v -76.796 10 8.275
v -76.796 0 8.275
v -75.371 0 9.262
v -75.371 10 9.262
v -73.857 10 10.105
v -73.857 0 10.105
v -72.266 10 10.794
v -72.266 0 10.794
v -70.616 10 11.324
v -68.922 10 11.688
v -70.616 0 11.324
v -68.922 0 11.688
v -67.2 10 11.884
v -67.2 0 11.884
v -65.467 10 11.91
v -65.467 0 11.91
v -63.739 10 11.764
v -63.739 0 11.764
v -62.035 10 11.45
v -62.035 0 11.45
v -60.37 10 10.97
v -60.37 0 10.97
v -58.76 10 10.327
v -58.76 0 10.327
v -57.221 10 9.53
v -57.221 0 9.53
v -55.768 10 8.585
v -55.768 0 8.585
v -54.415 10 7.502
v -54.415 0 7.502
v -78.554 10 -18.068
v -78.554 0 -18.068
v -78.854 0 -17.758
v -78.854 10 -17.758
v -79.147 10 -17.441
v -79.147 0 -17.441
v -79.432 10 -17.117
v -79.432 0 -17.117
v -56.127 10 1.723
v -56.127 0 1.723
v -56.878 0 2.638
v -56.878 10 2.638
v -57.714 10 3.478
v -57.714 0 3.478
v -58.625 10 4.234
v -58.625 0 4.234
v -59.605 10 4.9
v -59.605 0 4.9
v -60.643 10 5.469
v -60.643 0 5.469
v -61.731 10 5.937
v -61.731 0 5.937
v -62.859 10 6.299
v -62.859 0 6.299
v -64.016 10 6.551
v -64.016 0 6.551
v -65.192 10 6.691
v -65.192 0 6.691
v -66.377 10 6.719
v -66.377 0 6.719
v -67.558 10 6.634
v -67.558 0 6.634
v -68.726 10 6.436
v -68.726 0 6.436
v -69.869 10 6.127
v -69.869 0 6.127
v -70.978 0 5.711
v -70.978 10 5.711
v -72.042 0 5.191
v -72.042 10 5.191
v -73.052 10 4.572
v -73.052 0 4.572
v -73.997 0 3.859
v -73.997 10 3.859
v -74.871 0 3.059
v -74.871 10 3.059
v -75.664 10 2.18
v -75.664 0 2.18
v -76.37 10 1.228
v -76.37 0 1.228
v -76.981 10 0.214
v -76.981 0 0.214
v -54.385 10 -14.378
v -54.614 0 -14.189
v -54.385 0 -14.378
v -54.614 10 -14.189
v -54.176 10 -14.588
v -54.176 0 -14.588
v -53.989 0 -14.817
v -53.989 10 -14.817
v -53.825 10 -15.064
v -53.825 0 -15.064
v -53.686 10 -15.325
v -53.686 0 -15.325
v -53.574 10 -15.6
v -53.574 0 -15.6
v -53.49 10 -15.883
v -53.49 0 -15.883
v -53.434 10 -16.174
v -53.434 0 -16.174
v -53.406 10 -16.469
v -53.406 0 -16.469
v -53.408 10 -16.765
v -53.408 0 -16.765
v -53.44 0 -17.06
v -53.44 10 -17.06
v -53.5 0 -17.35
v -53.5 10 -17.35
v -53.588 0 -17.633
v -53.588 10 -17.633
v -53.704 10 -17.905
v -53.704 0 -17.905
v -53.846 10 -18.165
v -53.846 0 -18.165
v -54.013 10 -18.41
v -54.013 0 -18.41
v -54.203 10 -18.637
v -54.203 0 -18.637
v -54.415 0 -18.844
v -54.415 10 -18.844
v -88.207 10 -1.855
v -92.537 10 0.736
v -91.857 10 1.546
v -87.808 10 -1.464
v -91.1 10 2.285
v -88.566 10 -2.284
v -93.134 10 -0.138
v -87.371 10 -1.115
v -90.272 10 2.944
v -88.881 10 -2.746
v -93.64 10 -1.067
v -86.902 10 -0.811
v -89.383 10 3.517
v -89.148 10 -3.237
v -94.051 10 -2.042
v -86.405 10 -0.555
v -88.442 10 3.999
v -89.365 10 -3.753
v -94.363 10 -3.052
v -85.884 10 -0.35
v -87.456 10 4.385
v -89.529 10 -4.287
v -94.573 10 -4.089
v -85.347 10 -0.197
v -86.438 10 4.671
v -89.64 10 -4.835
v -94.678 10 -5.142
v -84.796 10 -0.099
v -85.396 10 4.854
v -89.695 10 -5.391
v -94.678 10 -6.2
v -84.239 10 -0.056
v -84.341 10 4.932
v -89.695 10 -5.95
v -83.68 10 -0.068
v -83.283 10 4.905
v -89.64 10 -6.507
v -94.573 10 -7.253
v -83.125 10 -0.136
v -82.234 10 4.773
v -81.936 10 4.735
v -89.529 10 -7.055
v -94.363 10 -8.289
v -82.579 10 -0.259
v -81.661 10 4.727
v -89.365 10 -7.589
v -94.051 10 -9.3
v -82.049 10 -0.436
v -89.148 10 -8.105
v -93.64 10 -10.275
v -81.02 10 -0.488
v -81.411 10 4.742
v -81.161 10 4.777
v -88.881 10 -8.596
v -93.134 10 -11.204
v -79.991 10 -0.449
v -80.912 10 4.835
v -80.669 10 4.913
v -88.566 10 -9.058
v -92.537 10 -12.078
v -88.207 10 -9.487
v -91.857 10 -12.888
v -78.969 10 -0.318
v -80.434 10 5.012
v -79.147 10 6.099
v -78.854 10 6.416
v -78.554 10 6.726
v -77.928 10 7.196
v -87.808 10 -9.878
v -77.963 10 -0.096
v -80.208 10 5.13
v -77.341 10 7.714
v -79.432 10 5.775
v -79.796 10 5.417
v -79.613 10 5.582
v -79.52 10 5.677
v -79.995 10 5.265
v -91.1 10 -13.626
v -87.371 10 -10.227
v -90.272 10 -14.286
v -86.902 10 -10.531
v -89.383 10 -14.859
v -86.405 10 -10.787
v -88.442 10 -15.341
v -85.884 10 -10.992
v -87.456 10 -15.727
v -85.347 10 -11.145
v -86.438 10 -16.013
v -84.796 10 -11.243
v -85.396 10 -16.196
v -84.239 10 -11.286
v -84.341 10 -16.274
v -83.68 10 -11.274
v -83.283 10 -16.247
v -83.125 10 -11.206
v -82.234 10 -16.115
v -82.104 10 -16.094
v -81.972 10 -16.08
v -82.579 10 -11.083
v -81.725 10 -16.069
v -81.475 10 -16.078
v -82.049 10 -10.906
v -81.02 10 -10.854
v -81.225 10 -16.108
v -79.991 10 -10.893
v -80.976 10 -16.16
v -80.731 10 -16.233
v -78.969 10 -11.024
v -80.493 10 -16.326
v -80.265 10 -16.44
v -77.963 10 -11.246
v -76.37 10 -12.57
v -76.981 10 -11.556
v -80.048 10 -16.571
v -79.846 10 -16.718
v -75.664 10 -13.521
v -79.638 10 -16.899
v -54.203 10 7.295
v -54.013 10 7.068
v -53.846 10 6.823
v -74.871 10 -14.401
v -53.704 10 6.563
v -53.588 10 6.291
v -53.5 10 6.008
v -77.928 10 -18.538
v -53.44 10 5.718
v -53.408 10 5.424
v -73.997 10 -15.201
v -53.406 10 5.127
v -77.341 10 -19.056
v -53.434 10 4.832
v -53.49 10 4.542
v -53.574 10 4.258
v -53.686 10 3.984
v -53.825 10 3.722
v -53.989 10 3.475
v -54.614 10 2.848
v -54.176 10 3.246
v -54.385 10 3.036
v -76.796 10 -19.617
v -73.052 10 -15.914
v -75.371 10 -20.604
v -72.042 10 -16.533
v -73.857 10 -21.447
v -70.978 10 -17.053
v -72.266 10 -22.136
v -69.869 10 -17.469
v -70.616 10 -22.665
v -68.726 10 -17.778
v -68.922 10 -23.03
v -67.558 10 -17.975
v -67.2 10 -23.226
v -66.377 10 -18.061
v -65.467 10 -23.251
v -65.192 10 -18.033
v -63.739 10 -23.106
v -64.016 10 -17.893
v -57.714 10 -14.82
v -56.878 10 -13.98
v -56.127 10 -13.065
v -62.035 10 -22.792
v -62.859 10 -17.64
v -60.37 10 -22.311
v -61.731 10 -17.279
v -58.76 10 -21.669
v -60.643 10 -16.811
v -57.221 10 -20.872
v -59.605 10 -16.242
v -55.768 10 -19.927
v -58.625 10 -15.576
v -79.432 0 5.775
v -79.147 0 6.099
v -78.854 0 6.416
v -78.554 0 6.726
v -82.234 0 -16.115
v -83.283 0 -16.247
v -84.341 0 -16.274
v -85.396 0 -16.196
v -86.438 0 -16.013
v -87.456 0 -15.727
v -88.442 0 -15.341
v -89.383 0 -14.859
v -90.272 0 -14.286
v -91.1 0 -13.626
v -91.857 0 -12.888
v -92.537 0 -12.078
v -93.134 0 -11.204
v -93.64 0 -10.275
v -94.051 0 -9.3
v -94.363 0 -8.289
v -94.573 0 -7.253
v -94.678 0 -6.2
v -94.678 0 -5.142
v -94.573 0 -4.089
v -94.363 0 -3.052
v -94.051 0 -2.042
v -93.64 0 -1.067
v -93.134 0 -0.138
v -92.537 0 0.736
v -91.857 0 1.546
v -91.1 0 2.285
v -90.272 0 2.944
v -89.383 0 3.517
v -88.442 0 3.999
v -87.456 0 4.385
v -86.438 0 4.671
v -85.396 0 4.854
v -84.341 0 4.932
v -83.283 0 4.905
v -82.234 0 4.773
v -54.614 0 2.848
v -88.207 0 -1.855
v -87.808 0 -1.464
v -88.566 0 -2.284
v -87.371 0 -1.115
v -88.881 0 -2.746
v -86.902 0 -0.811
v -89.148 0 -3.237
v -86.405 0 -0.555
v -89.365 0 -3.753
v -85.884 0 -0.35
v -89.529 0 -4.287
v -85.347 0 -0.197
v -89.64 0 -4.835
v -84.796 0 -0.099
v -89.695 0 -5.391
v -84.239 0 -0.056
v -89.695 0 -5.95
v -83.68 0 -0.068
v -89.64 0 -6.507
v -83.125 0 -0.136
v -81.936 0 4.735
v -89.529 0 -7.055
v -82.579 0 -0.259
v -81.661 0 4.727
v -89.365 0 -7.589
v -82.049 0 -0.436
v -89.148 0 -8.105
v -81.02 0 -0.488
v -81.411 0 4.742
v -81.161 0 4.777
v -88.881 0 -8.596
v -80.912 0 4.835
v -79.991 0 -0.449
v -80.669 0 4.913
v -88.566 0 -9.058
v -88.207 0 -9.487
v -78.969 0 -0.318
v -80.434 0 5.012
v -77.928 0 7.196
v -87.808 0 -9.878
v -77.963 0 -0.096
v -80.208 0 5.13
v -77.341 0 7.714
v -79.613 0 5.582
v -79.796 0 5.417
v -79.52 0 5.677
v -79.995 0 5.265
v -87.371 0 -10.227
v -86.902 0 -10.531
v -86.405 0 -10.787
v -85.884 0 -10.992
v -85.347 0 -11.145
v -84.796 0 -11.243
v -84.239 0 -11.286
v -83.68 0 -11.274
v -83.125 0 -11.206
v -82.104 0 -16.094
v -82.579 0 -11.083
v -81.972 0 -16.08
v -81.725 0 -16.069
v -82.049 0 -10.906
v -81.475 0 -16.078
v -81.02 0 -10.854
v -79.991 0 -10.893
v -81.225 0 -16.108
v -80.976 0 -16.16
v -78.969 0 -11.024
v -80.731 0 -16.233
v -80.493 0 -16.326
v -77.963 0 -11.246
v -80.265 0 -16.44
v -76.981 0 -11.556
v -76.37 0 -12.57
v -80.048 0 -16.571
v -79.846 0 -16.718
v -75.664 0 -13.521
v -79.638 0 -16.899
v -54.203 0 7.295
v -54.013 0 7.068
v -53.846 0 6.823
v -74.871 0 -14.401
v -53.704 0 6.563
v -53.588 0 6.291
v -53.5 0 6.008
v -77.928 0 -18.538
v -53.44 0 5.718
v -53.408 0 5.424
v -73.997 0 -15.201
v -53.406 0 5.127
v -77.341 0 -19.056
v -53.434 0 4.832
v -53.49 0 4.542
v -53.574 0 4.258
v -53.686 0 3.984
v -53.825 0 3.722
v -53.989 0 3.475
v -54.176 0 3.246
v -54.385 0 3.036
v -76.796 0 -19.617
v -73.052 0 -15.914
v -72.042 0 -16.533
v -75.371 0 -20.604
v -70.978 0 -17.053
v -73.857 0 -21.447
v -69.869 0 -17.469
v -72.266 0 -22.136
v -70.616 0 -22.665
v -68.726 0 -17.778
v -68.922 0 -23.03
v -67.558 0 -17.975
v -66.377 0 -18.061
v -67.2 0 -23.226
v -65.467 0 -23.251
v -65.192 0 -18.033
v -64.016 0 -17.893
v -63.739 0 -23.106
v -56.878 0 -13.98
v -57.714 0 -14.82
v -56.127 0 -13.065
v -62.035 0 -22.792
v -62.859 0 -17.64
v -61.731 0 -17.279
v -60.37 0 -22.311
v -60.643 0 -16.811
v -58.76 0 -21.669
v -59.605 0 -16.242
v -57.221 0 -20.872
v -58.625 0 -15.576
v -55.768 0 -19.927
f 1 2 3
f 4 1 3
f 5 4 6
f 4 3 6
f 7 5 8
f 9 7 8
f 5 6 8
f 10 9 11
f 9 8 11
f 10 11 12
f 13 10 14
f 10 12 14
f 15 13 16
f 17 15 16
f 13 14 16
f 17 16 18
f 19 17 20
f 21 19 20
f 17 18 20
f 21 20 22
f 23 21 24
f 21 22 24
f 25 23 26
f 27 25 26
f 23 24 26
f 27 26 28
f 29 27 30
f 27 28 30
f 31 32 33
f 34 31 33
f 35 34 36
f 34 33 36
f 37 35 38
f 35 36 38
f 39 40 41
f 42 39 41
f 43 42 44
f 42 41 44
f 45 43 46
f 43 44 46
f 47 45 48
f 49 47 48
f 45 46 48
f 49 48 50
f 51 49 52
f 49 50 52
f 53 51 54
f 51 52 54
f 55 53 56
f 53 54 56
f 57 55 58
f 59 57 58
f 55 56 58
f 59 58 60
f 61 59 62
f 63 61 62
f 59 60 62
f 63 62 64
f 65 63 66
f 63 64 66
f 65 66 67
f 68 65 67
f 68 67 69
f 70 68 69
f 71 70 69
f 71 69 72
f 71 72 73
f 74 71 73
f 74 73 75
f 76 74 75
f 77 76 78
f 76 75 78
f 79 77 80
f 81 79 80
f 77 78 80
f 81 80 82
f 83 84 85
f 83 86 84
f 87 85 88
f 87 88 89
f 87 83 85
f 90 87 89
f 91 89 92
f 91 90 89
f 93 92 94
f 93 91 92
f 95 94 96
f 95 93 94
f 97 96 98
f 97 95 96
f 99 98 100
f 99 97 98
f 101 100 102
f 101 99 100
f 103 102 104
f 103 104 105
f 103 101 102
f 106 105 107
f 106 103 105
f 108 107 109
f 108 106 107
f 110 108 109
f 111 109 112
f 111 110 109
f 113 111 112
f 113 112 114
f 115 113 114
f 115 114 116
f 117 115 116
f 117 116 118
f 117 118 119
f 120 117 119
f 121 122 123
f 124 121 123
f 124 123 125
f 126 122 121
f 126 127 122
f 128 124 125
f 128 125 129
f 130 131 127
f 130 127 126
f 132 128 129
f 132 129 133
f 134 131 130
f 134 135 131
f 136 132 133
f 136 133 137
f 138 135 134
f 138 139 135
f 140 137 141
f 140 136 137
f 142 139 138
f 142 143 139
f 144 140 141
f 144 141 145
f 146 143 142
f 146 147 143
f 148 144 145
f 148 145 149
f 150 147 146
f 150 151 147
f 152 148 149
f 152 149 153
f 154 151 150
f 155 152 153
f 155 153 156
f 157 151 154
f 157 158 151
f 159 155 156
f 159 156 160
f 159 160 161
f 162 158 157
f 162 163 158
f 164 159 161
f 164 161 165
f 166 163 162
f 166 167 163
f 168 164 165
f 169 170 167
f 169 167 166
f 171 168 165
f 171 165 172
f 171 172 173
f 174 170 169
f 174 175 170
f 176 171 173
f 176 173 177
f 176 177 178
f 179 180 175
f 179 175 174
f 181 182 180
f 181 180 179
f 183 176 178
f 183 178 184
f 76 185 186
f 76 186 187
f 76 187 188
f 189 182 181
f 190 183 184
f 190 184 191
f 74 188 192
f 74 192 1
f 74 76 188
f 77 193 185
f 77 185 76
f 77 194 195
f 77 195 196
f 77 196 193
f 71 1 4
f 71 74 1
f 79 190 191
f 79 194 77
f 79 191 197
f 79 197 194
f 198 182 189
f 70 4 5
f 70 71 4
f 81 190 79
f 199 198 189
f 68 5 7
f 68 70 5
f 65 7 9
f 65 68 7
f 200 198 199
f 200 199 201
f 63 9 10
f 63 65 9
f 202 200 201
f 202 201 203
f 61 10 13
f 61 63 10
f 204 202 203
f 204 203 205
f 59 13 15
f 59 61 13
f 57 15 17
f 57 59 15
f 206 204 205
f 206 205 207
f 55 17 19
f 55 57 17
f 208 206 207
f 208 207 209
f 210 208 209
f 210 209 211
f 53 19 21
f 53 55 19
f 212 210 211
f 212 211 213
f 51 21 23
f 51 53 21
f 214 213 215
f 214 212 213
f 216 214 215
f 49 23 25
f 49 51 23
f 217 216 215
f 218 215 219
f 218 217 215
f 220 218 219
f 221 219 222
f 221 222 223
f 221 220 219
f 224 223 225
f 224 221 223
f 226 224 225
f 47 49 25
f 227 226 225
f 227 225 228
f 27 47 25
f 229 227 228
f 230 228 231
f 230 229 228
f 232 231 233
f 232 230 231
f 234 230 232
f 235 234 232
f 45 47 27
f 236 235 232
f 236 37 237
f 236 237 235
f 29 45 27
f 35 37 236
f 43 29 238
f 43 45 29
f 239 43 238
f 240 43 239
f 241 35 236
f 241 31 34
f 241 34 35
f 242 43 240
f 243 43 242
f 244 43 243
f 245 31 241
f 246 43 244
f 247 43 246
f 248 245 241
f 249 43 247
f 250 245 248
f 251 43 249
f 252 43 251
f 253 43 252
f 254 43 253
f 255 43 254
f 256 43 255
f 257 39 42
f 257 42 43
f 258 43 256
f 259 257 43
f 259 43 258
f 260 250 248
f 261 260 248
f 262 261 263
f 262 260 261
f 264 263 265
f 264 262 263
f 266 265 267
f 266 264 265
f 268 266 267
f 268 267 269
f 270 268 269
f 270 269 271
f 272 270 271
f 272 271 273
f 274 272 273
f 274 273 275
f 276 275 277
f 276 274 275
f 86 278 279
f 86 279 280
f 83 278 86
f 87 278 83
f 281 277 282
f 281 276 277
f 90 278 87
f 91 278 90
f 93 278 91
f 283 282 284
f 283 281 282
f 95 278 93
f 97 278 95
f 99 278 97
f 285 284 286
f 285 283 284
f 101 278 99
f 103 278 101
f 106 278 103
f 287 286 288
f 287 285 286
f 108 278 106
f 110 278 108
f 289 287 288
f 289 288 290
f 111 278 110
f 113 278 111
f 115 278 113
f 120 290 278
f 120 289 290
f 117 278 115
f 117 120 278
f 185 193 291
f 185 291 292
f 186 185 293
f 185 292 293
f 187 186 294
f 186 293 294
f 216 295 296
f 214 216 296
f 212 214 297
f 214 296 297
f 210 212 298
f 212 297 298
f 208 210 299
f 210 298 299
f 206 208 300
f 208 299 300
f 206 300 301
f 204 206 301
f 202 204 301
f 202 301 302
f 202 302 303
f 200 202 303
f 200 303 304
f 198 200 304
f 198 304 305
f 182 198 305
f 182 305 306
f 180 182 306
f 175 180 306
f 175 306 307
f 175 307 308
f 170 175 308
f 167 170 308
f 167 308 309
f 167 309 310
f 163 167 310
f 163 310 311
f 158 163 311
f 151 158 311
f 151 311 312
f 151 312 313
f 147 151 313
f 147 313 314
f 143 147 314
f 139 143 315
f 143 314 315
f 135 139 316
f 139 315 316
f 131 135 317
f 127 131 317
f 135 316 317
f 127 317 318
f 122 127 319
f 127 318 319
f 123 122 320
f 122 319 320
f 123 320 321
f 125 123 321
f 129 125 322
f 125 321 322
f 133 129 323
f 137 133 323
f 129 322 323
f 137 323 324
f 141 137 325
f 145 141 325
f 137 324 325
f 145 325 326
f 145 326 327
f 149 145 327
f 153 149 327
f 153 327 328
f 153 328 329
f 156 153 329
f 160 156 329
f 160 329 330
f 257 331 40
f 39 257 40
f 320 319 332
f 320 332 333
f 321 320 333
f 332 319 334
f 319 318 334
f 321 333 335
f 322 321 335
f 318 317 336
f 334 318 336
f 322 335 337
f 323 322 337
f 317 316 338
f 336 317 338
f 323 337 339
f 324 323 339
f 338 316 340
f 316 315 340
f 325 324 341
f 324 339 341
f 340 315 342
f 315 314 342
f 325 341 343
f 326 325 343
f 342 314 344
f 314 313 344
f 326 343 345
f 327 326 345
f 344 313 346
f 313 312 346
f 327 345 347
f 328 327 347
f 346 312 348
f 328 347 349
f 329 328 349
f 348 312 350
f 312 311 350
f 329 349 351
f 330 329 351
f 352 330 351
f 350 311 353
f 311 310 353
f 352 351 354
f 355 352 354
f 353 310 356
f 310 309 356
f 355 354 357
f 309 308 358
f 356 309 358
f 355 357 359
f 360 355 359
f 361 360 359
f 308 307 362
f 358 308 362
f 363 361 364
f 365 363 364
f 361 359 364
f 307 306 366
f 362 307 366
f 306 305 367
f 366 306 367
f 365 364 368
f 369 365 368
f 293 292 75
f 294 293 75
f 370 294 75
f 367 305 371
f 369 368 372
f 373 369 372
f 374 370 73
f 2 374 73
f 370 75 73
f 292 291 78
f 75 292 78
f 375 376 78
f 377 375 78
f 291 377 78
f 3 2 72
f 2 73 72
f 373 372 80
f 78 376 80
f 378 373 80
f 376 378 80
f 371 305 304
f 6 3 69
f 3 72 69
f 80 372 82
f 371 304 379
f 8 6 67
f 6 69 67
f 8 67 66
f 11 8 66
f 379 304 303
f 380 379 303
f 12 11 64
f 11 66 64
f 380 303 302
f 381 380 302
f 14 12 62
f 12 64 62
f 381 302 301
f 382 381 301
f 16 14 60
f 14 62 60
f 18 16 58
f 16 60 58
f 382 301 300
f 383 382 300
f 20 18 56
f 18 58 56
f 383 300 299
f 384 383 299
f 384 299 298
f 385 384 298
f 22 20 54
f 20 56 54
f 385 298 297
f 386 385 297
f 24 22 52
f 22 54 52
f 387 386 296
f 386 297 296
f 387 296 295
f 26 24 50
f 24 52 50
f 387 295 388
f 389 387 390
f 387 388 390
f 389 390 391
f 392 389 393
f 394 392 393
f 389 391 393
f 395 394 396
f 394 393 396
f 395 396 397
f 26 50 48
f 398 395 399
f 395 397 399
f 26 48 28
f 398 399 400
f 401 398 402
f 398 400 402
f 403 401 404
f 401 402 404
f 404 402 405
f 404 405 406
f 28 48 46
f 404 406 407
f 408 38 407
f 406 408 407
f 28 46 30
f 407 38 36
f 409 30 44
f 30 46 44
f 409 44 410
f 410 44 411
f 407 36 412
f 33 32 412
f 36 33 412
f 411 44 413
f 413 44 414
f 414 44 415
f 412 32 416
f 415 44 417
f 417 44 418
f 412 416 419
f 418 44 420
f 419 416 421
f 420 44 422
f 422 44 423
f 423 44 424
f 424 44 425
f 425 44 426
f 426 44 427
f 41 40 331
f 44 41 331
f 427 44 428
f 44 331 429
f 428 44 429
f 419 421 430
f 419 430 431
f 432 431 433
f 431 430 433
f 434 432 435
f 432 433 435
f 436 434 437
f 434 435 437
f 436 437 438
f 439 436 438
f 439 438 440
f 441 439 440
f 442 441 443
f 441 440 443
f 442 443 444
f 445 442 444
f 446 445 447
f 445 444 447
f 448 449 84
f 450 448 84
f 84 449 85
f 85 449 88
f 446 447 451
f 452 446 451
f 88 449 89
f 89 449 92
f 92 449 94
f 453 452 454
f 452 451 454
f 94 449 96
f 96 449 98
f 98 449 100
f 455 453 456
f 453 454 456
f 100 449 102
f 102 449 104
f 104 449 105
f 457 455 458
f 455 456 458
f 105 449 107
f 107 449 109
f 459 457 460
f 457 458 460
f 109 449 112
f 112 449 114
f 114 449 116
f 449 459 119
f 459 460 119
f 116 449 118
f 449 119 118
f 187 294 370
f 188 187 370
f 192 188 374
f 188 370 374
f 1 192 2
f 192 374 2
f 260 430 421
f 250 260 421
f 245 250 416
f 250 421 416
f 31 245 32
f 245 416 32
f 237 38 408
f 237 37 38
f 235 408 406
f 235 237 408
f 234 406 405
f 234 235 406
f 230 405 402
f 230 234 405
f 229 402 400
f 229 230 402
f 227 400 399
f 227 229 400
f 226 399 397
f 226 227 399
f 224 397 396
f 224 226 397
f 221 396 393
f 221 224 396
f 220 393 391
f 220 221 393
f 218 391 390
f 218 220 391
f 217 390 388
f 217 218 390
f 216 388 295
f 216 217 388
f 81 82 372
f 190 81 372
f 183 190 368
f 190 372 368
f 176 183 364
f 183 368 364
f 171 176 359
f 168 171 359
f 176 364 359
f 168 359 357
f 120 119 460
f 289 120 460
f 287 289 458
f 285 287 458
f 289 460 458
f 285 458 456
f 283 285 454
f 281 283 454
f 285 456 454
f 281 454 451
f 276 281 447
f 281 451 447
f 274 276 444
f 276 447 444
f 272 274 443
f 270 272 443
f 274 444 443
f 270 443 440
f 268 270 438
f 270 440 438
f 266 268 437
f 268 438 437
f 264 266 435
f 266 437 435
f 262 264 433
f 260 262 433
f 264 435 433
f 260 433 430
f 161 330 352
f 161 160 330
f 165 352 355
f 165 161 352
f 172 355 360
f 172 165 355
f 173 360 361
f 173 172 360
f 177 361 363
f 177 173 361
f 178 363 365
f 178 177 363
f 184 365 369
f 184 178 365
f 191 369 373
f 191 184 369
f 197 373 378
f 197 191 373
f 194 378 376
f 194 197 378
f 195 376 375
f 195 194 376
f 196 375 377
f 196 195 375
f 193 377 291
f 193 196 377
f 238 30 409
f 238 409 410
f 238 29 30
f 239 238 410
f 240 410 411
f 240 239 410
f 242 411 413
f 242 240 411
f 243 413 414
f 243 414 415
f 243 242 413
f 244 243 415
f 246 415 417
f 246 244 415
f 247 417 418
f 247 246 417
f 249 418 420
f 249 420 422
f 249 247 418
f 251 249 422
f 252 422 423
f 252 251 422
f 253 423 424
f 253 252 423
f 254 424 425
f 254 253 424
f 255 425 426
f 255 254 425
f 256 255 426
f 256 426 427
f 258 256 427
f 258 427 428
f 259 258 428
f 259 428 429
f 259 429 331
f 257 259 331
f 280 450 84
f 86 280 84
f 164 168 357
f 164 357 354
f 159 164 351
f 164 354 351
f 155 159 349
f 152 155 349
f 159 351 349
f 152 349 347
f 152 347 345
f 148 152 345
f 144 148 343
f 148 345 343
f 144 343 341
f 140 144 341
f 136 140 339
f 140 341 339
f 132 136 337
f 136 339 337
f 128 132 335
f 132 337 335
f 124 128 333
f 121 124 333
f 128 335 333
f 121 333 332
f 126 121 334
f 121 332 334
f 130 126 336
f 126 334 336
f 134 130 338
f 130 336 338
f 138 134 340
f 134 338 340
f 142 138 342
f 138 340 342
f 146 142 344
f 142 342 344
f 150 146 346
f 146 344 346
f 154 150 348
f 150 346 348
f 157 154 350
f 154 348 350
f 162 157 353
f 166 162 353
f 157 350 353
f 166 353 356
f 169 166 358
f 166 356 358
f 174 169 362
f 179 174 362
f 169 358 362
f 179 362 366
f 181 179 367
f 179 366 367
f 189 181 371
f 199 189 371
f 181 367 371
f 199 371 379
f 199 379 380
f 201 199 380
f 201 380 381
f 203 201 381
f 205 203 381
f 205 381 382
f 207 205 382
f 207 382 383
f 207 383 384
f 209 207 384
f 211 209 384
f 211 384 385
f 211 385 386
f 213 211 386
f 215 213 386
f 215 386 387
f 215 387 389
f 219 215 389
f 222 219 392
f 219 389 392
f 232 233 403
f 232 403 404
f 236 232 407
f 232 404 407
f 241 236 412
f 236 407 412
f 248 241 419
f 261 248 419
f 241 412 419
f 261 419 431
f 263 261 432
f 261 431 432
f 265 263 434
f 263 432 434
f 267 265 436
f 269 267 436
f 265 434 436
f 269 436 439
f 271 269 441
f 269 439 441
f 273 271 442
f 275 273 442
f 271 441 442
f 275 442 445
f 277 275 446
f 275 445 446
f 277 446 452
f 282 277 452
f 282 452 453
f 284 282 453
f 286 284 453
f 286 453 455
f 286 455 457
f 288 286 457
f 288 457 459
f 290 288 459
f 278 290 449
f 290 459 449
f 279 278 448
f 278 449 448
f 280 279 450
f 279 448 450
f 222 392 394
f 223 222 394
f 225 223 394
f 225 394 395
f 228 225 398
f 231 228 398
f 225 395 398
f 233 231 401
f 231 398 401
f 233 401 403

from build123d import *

# Parameters (mm, degrees)
BOSS_EXTRUDE3_DEPTH = 10
FILLET3_R           = 3


with BuildPart() as part:
    # Sketch1 → Boss-Extrude3 (new body)
    with BuildSketch(Plane(origin=(0, 0, 0), x_dir=(1, 0, 0), z_dir=(0, 1, 0))):
        with BuildLine():
            Line((-56.127249733, 13.064532605), (-51.956028901, 16.165106996))
            ThreePointArc((-51.956028901, 16.165106996), (-63.652726326, 23.094481669), (-76.795589263, 19.616821846))
            ThreePointArc((-76.795589263, 19.616821846), (-77.629630472, 18.791218581), (-78.553962744, 18.068131215))
            ThreePointArc((-78.553962744, 18.068131215), (-79.603636657, 16.913208133), (-80.546816269, 15.669795544))
            ThreePointArc((-80.546816269, 15.669795544), (-94.691323687, 5.670927287), (-80.546816269, -4.32794097))
            ThreePointArc((-80.546816269, -4.32794097), (-79.603636657, -5.571353559), (-78.553962744, -6.726276641))
            ThreePointArc((-78.553962744, -6.726276641), (-77.629630472, -7.449364007), (-76.795589263, -8.274967272))
            ThreePointArc((-76.795589263, -8.274967272), (-63.652726326, -11.752627095), (-51.956028901, -4.823252422))
            Line((-51.956028901, -4.823252422), (-56.127249733, -1.722678031))
            ThreePointArc((-56.127249733, -1.722678031), (-66.96819929, -6.690371176), (-76.981216312, -0.213979234))
            ThreePointArc((-76.981216312, -0.213979234), (-79.478589631, 0.394605678), (-82.048720515, 0.435548601))
            ThreePointArc((-82.048720515, 0.435548601), (-89.702342556, 5.670927287), (-82.048720515, 10.906305973))
            ThreePointArc((-82.048720515, 10.906305973), (-79.478589631, 10.947248896), (-76.981216312, 11.555833808))
            ThreePointArc((-76.981216312, 11.555833808), (-66.96819929, 18.03222575), (-56.127249733, 13.064532605))
        make_face()
    extrude(amount=BOSS_EXTRUDE3_DEPTH)

    # Fillet3
    fillet3_edges = [part.edges().sort_by_distance(p)[0] for p in [
        (-51.956028901, 5, 4.823252422),
        (-80.546816269, 5, 4.32794097),
        (-80.546816269, 5, -15.669795544),
        (-51.956028901, 5, -16.165106996),
    ]]
    fillet(fillet3_edges, radius=FILLET3_R)


solid = part.part
